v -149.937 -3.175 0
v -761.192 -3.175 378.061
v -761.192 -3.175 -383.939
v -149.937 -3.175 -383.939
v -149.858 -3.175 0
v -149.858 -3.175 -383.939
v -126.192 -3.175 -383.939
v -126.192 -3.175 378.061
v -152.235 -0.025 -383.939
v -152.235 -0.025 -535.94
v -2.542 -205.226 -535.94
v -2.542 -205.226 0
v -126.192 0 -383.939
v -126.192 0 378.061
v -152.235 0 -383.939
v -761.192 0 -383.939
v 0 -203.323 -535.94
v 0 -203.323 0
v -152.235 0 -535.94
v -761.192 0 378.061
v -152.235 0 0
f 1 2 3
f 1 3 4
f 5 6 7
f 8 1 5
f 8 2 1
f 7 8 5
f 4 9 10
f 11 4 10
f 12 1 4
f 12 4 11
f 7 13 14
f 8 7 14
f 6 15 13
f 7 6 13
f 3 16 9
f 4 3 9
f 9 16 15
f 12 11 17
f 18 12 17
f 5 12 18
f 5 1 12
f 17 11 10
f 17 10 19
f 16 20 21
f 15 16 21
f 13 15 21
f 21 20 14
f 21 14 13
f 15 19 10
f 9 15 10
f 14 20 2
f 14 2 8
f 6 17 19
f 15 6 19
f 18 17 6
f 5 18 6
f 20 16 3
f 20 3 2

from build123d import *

# Parameters (mm, degrees)
F0_W     = 635
F0_H     = 762
F1_DEPTH = 3.175
F3_DEPTH = 535.94


with BuildPart() as f1:
    # F0 (on Front) → F1 (new body)
    with BuildSketch(Plane.XZ):
        with Locations((-443.691645, -2.938756)):
            Rectangle(F0_W, F0_H)
    extrude(amount=F1_DEPTH)

    # F2 (on Top) → F3 (join)
    with BuildSketch(Plane.XY):
        Polygon((0, -203.323487), (-152.235212, 0), (-152.235212, -0.024561), (-2.541544, -205.226427), align=None)
    extrude(amount=-F3_DEPTH)


solid = f1.part
